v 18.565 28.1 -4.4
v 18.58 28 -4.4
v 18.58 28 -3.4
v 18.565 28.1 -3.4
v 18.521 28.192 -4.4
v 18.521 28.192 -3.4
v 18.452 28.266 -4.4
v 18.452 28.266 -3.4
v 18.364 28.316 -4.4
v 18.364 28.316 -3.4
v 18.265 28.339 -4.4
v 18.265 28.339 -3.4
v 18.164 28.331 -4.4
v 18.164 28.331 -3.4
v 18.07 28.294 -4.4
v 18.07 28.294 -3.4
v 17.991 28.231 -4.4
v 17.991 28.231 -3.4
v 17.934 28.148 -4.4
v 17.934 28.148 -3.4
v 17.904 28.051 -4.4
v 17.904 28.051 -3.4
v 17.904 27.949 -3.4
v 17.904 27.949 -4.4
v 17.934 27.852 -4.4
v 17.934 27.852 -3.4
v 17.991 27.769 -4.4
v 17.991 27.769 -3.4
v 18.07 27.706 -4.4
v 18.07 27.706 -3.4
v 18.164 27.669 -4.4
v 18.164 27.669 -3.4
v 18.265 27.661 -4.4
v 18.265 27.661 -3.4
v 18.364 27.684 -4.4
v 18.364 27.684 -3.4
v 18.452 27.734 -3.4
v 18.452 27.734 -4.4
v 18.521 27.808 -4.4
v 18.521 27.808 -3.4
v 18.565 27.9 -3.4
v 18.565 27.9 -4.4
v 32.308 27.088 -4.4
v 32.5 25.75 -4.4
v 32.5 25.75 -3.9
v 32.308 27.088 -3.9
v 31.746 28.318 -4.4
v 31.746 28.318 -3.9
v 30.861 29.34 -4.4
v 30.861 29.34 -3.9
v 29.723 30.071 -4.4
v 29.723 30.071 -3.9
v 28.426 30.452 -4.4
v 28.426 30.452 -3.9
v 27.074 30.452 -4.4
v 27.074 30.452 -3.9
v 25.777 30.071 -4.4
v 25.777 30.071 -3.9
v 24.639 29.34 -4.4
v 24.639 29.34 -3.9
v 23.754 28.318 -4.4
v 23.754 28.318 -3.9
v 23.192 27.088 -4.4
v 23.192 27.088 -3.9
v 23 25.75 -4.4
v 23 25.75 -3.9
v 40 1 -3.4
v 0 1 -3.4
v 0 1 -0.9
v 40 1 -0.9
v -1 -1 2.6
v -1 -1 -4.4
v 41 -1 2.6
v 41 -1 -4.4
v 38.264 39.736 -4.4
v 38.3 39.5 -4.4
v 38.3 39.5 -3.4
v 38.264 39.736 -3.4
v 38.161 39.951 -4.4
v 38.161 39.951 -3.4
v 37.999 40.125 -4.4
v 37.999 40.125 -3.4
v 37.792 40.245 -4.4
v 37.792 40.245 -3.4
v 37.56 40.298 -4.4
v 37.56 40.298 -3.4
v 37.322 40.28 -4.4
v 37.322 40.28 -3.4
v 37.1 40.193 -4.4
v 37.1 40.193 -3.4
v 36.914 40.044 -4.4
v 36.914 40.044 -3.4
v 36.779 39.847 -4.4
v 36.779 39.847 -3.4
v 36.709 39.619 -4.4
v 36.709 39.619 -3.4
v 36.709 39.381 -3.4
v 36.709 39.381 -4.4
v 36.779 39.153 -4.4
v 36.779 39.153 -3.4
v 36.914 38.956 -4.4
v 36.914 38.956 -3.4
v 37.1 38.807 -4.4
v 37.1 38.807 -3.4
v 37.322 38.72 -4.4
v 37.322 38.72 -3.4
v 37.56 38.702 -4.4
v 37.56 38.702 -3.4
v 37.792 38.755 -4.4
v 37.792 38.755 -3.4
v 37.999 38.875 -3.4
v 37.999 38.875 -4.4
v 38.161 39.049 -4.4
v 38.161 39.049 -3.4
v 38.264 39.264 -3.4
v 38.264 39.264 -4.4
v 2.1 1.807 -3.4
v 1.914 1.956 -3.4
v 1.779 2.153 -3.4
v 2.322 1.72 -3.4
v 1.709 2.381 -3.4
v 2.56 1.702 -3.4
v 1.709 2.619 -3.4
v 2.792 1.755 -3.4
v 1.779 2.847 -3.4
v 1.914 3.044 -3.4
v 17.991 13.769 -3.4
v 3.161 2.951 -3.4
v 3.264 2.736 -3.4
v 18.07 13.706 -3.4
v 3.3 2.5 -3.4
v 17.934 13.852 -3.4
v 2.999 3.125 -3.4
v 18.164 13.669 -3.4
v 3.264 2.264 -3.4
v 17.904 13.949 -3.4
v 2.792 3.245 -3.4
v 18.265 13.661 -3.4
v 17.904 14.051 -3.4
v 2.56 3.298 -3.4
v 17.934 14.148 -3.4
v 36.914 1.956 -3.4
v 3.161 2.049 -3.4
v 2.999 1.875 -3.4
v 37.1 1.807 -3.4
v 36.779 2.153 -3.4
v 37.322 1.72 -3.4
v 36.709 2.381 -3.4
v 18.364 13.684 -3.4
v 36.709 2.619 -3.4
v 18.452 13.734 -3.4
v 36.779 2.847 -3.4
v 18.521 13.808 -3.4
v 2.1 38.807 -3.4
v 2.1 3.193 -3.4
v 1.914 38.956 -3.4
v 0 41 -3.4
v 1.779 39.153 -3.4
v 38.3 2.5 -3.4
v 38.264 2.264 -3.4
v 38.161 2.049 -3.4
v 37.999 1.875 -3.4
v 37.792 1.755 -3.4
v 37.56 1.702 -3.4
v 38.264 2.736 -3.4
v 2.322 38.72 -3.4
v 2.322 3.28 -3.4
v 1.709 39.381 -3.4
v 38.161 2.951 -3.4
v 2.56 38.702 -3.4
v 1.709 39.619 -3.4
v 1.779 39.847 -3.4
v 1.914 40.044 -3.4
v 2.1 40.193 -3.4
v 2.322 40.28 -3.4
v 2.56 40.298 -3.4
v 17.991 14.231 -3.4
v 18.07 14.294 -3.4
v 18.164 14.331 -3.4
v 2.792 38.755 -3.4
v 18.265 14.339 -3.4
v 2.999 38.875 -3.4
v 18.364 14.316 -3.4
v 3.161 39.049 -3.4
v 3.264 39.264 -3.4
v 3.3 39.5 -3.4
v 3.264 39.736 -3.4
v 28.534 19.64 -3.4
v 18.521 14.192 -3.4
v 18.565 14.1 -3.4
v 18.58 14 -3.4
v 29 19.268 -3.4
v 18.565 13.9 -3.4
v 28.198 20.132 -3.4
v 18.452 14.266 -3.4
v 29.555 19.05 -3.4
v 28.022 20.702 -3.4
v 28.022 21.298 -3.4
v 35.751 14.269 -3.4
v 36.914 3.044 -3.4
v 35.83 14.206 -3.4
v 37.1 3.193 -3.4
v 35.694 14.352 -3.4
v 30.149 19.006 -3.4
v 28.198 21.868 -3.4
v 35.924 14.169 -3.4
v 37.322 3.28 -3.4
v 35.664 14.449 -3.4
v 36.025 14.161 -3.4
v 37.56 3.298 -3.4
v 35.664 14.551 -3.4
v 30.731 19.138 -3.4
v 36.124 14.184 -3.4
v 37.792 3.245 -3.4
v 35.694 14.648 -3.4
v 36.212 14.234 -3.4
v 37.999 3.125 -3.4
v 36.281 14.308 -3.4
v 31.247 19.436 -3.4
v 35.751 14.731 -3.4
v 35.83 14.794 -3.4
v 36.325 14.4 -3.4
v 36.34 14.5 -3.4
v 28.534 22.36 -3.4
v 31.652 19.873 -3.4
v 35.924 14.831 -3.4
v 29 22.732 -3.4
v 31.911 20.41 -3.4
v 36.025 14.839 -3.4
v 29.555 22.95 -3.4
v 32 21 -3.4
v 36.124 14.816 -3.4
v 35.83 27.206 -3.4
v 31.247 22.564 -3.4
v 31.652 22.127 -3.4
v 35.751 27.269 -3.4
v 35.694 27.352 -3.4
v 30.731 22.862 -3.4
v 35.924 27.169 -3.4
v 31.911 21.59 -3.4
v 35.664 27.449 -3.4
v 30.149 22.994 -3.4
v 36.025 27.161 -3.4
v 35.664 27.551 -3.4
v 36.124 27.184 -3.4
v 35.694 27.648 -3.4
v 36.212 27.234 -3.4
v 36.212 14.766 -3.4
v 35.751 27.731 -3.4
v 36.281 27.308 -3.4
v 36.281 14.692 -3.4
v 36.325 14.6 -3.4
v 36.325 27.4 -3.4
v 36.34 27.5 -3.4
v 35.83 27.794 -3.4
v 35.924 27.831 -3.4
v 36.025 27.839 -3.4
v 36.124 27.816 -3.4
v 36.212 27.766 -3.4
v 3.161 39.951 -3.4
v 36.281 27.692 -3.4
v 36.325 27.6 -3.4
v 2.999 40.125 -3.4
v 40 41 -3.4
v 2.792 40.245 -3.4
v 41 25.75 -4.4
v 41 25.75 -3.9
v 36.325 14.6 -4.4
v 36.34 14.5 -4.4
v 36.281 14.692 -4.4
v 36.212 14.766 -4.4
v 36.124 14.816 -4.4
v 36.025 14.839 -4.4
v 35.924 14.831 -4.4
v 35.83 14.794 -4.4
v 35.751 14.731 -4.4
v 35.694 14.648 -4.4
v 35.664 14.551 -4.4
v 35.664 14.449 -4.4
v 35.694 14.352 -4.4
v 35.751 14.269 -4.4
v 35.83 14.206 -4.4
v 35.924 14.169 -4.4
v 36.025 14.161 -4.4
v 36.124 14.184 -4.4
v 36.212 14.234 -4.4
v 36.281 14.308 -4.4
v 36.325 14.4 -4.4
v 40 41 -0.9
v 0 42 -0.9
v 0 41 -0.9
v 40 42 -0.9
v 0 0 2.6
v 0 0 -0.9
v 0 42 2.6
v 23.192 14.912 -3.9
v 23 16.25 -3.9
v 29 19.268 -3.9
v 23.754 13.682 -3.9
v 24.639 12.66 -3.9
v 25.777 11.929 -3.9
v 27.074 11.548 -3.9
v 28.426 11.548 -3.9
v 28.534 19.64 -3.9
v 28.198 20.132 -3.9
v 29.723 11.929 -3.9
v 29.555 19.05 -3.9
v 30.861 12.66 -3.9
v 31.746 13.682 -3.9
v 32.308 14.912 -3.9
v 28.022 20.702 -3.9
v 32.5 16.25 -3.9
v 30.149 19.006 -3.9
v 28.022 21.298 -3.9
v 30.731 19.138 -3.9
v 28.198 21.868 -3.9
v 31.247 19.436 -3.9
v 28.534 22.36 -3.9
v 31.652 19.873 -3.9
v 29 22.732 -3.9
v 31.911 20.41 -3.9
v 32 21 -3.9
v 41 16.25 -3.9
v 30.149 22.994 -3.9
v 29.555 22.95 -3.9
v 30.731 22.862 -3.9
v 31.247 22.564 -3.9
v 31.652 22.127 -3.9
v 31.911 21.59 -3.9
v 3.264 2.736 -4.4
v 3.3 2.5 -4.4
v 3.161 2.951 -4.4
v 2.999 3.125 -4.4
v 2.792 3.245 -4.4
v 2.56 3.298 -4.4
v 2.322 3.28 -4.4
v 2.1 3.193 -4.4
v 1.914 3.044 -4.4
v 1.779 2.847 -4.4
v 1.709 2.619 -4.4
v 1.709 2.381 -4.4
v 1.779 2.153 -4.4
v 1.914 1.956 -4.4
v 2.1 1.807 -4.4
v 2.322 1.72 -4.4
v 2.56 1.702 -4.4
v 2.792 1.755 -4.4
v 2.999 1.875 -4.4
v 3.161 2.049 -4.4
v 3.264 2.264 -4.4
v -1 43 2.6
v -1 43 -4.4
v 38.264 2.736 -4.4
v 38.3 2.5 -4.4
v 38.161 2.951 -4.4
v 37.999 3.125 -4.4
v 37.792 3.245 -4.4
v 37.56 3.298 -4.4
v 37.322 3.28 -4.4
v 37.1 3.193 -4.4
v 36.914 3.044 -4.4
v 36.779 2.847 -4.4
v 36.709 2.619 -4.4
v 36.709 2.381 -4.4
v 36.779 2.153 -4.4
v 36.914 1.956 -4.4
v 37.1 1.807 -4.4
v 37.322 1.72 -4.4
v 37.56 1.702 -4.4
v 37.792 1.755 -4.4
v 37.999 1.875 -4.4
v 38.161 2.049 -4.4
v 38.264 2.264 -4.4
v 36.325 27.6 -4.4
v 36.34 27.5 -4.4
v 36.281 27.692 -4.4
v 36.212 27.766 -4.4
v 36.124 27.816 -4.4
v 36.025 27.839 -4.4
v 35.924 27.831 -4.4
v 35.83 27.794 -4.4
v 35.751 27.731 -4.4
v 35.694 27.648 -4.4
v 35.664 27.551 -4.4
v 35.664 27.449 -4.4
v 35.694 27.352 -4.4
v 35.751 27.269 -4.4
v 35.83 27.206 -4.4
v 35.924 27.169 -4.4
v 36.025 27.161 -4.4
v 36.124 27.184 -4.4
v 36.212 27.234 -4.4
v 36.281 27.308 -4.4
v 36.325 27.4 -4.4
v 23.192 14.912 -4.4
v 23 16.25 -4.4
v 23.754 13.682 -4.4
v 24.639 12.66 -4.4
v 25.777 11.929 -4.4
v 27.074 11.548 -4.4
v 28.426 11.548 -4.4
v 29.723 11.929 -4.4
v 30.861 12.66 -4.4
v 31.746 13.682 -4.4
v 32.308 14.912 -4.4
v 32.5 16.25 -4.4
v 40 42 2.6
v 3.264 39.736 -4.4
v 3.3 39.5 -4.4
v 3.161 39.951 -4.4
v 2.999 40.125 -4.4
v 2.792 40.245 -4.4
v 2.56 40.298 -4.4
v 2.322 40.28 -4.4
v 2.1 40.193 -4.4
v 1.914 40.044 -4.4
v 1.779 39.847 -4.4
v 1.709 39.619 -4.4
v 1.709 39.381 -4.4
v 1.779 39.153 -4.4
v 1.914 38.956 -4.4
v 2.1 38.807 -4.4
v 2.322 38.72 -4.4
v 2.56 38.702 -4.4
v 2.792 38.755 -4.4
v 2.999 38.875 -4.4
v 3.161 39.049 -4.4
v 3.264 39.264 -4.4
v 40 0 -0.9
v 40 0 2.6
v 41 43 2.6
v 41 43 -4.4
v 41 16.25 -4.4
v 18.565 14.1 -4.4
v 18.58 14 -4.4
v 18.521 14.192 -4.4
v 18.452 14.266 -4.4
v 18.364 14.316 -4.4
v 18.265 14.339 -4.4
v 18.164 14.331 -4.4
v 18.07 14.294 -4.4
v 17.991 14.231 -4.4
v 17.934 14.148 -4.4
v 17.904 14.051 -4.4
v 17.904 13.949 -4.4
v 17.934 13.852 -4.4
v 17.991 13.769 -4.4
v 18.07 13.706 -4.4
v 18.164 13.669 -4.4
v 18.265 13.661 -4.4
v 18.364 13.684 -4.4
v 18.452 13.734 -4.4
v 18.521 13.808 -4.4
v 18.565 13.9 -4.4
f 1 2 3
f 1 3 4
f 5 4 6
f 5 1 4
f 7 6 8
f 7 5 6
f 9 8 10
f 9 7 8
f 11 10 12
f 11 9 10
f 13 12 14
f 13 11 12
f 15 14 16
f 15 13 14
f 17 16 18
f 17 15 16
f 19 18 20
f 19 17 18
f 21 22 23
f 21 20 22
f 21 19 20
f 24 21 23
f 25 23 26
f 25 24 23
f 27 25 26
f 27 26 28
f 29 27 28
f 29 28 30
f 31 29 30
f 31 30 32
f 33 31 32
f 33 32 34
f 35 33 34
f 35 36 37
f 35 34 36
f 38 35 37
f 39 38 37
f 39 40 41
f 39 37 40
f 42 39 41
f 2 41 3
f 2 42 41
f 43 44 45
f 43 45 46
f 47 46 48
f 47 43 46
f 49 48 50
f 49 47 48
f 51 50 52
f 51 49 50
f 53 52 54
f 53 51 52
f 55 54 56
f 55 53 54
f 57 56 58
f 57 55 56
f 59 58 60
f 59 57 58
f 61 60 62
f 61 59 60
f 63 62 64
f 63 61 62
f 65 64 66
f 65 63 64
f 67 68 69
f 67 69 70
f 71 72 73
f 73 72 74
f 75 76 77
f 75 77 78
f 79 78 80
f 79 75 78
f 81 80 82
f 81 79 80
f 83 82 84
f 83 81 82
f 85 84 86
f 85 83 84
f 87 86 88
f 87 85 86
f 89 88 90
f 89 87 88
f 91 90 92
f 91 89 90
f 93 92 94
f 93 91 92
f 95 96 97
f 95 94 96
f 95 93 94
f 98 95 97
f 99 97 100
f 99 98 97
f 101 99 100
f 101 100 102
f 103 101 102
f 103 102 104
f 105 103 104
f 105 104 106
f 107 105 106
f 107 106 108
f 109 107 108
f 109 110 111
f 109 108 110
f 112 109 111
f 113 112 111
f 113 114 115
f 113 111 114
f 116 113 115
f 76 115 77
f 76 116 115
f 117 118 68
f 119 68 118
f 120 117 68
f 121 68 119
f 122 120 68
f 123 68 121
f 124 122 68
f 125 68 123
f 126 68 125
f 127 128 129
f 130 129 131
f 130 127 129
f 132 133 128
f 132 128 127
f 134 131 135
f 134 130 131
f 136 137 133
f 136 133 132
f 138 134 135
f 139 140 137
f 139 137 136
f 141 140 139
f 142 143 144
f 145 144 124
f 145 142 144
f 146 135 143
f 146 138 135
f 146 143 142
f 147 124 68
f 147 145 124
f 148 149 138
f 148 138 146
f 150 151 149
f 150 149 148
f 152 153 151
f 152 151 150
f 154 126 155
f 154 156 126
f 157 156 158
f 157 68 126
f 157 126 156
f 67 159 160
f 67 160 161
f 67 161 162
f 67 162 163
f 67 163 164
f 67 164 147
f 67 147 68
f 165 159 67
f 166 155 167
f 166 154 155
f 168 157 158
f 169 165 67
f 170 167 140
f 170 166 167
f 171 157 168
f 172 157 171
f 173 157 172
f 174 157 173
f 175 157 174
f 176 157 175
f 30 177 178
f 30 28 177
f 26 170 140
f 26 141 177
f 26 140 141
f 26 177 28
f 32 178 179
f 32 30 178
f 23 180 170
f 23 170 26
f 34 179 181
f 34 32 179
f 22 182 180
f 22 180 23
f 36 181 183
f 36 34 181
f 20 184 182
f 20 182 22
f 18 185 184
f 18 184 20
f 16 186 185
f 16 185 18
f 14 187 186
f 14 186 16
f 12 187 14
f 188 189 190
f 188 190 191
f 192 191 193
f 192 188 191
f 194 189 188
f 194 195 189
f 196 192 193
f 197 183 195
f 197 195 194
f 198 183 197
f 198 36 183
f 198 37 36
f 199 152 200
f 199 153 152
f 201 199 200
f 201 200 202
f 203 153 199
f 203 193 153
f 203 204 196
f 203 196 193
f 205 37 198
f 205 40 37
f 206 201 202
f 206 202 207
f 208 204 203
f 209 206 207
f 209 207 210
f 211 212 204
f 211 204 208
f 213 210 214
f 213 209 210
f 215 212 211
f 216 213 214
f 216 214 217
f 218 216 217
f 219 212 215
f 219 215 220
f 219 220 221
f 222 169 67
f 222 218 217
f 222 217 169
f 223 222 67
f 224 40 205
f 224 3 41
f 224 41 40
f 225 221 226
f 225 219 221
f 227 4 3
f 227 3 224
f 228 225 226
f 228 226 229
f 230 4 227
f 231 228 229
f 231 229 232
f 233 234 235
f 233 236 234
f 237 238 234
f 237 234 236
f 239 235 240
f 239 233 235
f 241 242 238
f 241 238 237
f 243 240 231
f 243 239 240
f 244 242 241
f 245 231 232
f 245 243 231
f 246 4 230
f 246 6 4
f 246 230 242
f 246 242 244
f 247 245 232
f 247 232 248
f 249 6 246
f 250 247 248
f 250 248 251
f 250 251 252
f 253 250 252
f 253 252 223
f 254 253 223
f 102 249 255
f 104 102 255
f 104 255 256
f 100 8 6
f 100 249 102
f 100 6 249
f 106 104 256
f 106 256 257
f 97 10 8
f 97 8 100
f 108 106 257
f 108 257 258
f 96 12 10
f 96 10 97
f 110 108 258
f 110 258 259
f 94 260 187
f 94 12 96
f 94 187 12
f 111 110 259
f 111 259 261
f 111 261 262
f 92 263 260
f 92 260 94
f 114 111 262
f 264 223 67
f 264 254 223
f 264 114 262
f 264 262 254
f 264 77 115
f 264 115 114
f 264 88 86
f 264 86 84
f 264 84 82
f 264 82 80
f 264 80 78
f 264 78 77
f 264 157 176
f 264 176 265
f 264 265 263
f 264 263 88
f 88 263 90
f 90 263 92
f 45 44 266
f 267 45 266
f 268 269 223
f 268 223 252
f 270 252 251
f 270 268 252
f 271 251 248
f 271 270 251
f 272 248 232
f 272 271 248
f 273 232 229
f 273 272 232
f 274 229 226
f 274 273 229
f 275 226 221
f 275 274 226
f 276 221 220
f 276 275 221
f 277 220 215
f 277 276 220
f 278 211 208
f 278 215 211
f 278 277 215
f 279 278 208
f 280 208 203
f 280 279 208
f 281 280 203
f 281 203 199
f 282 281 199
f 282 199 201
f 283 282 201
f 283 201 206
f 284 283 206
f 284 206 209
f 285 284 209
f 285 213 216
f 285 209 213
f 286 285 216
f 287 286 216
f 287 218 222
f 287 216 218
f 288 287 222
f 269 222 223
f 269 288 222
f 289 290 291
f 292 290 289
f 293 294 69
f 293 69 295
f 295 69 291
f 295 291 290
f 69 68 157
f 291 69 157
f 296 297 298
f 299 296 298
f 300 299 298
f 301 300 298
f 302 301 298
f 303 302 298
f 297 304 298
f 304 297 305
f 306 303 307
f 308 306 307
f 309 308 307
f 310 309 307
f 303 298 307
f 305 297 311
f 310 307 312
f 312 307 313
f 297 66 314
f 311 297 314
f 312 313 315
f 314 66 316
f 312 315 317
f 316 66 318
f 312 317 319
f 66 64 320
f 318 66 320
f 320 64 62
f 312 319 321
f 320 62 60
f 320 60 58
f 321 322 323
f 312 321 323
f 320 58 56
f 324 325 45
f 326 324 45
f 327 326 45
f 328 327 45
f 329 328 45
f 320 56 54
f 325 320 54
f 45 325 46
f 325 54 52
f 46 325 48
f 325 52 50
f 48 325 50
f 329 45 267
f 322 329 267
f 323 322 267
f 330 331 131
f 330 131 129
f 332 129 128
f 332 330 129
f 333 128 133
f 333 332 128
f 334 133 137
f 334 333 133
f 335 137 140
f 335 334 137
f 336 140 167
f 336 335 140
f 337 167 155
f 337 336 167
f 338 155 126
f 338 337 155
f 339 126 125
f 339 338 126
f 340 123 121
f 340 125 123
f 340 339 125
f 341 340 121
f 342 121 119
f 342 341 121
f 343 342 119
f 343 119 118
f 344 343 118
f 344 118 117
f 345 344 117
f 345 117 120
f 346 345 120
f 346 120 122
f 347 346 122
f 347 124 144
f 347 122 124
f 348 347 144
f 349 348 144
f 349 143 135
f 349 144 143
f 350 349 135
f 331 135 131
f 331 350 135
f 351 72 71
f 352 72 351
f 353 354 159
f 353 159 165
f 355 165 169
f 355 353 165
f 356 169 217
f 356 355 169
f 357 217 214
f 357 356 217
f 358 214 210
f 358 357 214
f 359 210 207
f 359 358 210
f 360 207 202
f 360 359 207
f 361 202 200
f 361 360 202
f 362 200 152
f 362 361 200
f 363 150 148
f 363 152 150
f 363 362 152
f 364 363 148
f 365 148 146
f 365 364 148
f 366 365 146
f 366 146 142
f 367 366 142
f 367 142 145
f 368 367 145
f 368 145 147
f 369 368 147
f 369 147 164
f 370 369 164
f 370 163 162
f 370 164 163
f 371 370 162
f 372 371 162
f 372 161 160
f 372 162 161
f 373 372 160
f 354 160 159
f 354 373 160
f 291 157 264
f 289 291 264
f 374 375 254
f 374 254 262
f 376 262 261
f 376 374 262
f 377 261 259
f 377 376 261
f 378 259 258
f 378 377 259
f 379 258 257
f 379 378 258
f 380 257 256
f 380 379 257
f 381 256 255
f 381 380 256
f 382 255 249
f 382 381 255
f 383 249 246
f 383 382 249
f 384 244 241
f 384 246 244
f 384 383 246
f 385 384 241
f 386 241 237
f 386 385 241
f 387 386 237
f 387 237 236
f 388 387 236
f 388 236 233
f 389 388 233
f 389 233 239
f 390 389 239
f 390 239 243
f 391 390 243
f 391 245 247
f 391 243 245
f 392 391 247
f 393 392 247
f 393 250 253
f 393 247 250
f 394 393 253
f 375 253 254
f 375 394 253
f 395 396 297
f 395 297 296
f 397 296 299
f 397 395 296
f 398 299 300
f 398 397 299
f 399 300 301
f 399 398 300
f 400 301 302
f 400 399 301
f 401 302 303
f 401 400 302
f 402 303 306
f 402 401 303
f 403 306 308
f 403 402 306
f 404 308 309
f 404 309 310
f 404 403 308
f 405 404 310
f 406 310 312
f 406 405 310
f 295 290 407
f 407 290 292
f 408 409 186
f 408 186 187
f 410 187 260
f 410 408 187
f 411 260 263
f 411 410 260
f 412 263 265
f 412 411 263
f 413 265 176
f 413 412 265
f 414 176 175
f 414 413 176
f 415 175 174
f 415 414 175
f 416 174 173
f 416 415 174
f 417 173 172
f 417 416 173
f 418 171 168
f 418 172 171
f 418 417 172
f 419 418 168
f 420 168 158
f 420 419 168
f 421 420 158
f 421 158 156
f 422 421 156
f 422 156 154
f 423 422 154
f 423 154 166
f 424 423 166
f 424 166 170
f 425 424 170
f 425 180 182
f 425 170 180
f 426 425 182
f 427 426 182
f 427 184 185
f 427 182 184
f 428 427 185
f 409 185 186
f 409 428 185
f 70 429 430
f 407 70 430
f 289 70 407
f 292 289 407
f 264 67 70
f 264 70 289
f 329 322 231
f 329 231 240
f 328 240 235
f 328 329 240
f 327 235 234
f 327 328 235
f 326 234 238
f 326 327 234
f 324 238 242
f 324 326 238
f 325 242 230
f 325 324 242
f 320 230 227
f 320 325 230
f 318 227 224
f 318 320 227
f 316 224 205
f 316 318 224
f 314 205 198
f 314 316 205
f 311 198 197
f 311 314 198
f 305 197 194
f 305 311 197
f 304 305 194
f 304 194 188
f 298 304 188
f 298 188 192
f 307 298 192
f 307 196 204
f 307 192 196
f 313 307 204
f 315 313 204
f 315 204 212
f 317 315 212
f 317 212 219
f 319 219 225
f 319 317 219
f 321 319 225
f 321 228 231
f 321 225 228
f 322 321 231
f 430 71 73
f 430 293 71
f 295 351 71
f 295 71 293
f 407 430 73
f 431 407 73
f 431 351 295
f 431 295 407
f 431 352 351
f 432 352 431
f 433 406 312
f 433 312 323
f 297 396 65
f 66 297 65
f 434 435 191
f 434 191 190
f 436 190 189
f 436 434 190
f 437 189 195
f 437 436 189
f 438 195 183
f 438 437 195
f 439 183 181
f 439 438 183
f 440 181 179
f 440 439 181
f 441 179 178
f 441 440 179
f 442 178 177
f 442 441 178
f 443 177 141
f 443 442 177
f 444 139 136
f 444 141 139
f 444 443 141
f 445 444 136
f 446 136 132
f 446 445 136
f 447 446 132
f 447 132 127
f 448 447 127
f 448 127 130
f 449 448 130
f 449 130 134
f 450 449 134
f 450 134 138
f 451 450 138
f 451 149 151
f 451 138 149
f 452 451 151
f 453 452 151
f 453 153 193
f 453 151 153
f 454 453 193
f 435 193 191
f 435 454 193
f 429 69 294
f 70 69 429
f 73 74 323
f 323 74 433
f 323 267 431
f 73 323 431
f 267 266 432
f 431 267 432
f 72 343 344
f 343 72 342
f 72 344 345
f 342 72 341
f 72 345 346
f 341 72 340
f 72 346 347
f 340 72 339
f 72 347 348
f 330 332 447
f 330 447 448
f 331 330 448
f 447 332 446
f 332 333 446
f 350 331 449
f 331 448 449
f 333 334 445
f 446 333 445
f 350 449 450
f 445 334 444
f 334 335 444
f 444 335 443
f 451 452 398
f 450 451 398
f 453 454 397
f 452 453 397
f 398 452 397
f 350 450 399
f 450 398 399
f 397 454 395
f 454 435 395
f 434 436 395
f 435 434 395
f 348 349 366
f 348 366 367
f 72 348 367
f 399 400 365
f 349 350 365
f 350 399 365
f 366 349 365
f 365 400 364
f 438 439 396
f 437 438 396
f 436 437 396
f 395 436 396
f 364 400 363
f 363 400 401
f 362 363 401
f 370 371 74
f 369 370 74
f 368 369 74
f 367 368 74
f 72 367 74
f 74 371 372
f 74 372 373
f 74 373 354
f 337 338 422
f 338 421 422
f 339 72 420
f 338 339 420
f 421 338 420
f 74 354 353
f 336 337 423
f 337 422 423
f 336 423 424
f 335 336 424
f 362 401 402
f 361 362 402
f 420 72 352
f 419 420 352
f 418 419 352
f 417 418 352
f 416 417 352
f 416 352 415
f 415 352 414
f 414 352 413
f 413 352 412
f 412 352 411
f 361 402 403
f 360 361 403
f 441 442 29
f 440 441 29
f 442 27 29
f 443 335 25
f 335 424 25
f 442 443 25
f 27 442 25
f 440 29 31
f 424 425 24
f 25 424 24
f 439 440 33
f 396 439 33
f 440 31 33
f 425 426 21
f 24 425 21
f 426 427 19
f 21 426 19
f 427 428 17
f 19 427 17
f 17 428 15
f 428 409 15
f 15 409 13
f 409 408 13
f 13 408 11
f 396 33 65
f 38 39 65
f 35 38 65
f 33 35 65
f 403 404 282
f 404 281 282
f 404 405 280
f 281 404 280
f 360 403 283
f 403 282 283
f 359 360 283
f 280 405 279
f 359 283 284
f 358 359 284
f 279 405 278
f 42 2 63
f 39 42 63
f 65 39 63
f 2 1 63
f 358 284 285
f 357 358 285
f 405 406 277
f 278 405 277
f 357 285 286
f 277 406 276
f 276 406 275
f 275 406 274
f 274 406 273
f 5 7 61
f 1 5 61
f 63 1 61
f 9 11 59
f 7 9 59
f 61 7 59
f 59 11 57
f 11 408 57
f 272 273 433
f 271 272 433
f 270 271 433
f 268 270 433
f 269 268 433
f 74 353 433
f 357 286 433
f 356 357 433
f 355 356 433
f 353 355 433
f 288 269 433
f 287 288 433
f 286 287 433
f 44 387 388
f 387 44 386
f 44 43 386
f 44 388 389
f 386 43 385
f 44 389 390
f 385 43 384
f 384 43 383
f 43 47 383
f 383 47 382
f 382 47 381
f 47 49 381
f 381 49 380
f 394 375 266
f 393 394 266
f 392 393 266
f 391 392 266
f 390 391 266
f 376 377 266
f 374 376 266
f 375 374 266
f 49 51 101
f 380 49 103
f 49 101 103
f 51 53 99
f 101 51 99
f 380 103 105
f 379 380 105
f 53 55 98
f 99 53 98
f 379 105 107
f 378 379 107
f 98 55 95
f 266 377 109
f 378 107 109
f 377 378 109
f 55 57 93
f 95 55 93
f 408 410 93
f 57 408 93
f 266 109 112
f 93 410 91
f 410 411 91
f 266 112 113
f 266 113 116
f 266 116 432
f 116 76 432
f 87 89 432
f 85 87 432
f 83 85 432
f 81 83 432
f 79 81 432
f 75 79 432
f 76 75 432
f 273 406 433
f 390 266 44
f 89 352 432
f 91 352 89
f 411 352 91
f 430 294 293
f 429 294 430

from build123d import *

# Parameters (mm, degrees)
CYLINDER009_R     = 0.8
CYLINDER009_DEPTH = 20
CYLINDER010_R     = 0.8
CYLINDER010_DEPTH = 20
CYLINDER011_R     = 0.8
CYLINDER011_DEPTH = 20
CYLINDER008_R     = 0.8
CYLINDER008_DEPTH = 20
CYLINDER005_R     = 0.34
CYLINDER005_DEPTH = 100
CYLINDER006_R     = 0.34
CYLINDER006_DEPTH = 100
CYLINDER007_R     = 0.34
CYLINDER007_DEPTH = 100
CYLINDER004_R     = 0.34
CYLINDER004_DEPTH = 100
CYLINDER002_R     = 4.75
CYLINDER002_DEPTH = 0.5
CYLINDER003_R     = 4.75
CYLINDER003_DEPTH = 0.5
BOX008_W          = 18
BOX008_H          = 9.5
BOX008_DEPTH      = 0.5
BOX004_W          = 40
BOX004_H          = 1
BOX004_DEPTH      = 2.5
CYLINDER001_R     = 2
CYLINDER001_DEPTH = 20
BOX002_W          = 40
BOX002_H          = 42
BOX002_DEPTH      = 6
BOX001_W          = 42
BOX001_H          = 44
BOX001_DEPTH      = 7
BOX003_W          = 40
BOX003_H          = 1
BOX003_DEPTH      = 2.5


with BuildPart() as zylinder009:
    # Cylinder009 → Cylinder009 (new body)
    with BuildSketch(Plane(origin=(2.5, 2.5, -10), x_dir=(1, 0, 0), z_dir=(0, 0, 1))):
        Circle(CYLINDER009_R)
    extrude(amount=CYLINDER009_DEPTH)


with BuildPart() as zylinder010:
    # Cylinder010 → Cylinder010 (new body)
    with BuildSketch(Plane(origin=(37.5, 39.5, -10), x_dir=(1, 0, 0), z_dir=(0, 0, 1))):
        Circle(CYLINDER010_R)
    extrude(amount=CYLINDER010_DEPTH)


with BuildPart() as zylinder011:
    # Cylinder011 → Cylinder011 (new body)
    with BuildSketch(Plane(origin=(2.5, 39.5, -10), x_dir=(1, 0, 0), z_dir=(0, 0, 1))):
        Circle(CYLINDER011_R)
    extrude(amount=CYLINDER011_DEPTH)


with BuildPart() as compound005:
    # Cylinder008 → Cylinder008 (new body)
    with BuildSketch(Plane(origin=(37.5, 2.5, -10), x_dir=(1, 0, 0), z_dir=(0, 0, 1))):
        Circle(CYLINDER008_R)
    extrude(amount=CYLINDER008_DEPTH)

    # Compound005: union Zylinder009, Zylinder010, Zylinder011
    add(zylinder009.part)
    add(zylinder010.part)
    add(zylinder011.part)


with BuildPart() as zylinder005:
    # Cylinder005 → Cylinder005 (new body)
    with BuildSketch(Plane(origin=(18.24, 28, -50), x_dir=(1, 0, 0), z_dir=(0, 0, 1))):
        Circle(CYLINDER005_R)
    extrude(amount=CYLINDER005_DEPTH)


with BuildPart() as zylinder006:
    # Cylinder006 → Cylinder006 (new body)
    with BuildSketch(Plane(origin=(36, 14.5, -50), x_dir=(1, 0, 0), z_dir=(0, 0, 1))):
        Circle(CYLINDER006_R)
    extrude(amount=CYLINDER006_DEPTH)


with BuildPart() as zylinder007:
    # Cylinder007 → Cylinder007 (new body)
    with BuildSketch(Plane(origin=(36, 27.5, -50), x_dir=(1, 0, 0), z_dir=(0, 0, 1))):
        Circle(CYLINDER007_R)
    extrude(amount=CYLINDER007_DEPTH)


with BuildPart() as m1tapholes:
    # Cylinder004 → Cylinder004 (new body)
    with BuildSketch(Plane(origin=(18.24, 14, -50), x_dir=(1, 0, 0), z_dir=(0, 0, 1))):
        Circle(CYLINDER004_R)
    extrude(amount=CYLINDER004_DEPTH)

    # Compound002: union Zylinder005, Zylinder006, Zylinder007
    add(zylinder005.part)
    add(zylinder006.part)
    add(zylinder007.part)


with BuildPart() as zylinder002:
    # Cylinder002 → Cylinder002 (new body)
    with BuildSketch(Plane(origin=(27.75, 25.75, -4.4), x_dir=(1, 0, 0), z_dir=(0, 0, 1))):
        Circle(CYLINDER002_R)
    extrude(amount=CYLINDER002_DEPTH)


with BuildPart() as zylinder003:
    # Cylinder003 → Cylinder003 (new body)
    with BuildSketch(Plane(origin=(27.75, 16.25, -4.4), x_dir=(1, 0, 0), z_dir=(0, 0, 1))):
        Circle(CYLINDER003_R)
    extrude(amount=CYLINDER003_DEPTH)


with BuildPart() as fusion002:
    # Box008 → Box008 (new body)
    with BuildSketch(Plane(origin=(23, 16.25, -4.4), x_dir=(1, 0, 0), z_dir=(0, 0, 1))):
        with Locations((9, 4.75)):
            Rectangle(BOX008_W, BOX008_H)
    extrude(amount=BOX008_DEPTH)

    # Fusion002: union Zylinder002, Zylinder003
    add(zylinder002.part)
    add(zylinder003.part)


with BuildPart() as w_rfel004:
    # Box004 → Box004 (new body)
    with BuildSketch(Plane(origin=(0, 41, -3.4), x_dir=(1, 0, 0), z_dir=(0, 0, 1))):
        with Locations((20, 0.5)):
            Rectangle(BOX004_W, BOX004_H)
    extrude(amount=BOX004_DEPTH)


with BuildPart() as zylinder001:
    # Cylinder001 → Cylinder001 (new body)
    with BuildSketch(Plane(origin=(30, 21, -10), x_dir=(1, 0, 0), z_dir=(0, 0, 1))):
        Circle(CYLINDER001_R)
    extrude(amount=CYLINDER001_DEPTH)


with BuildPart() as w_rfel002:
    # Box002 → Box002 (new body)
    with BuildSketch(Plane.XY.offset(-3.4)):
        with Locations((20, 21)):
            Rectangle(BOX002_W, BOX002_H)
    extrude(amount=BOX002_DEPTH)


with BuildPart() as cut002:
    # Box001 → Box001 (new body)
    with BuildSketch(Plane(origin=(-1, -1, -4.4), x_dir=(1, 0, 0), z_dir=(0, 0, 1))):
        with Locations((21, 22)):
            Rectangle(BOX001_W, BOX001_H)
    extrude(amount=BOX001_DEPTH)

    # Cut001: cut Würfel002
    add(w_rfel002.part, mode=Mode.SUBTRACT)

    # Cut002: cut Zylinder001
    add(zylinder001.part, mode=Mode.SUBTRACT)


with BuildPart() as upperpart:
    # Box003 → Box003 (new body)
    with BuildSketch(Plane.XY.offset(-3.4)):
        with Locations((20, 0.5)):
            Rectangle(BOX003_W, BOX003_H)
    extrude(amount=BOX003_DEPTH)

    # Fusion: union Würfel004, Cut002
    add(w_rfel004.part)
    add(cut002.part)

    # Cut004: cut Fusion002
    add(fusion002.part, mode=Mode.SUBTRACT)

    # Cut005: cut M1TapHoles
    add(m1tapholes.part, mode=Mode.SUBTRACT)

    # Cut007: cut Compound005
    add(compound005.part, mode=Mode.SUBTRACT)


solid = upperpart.part
